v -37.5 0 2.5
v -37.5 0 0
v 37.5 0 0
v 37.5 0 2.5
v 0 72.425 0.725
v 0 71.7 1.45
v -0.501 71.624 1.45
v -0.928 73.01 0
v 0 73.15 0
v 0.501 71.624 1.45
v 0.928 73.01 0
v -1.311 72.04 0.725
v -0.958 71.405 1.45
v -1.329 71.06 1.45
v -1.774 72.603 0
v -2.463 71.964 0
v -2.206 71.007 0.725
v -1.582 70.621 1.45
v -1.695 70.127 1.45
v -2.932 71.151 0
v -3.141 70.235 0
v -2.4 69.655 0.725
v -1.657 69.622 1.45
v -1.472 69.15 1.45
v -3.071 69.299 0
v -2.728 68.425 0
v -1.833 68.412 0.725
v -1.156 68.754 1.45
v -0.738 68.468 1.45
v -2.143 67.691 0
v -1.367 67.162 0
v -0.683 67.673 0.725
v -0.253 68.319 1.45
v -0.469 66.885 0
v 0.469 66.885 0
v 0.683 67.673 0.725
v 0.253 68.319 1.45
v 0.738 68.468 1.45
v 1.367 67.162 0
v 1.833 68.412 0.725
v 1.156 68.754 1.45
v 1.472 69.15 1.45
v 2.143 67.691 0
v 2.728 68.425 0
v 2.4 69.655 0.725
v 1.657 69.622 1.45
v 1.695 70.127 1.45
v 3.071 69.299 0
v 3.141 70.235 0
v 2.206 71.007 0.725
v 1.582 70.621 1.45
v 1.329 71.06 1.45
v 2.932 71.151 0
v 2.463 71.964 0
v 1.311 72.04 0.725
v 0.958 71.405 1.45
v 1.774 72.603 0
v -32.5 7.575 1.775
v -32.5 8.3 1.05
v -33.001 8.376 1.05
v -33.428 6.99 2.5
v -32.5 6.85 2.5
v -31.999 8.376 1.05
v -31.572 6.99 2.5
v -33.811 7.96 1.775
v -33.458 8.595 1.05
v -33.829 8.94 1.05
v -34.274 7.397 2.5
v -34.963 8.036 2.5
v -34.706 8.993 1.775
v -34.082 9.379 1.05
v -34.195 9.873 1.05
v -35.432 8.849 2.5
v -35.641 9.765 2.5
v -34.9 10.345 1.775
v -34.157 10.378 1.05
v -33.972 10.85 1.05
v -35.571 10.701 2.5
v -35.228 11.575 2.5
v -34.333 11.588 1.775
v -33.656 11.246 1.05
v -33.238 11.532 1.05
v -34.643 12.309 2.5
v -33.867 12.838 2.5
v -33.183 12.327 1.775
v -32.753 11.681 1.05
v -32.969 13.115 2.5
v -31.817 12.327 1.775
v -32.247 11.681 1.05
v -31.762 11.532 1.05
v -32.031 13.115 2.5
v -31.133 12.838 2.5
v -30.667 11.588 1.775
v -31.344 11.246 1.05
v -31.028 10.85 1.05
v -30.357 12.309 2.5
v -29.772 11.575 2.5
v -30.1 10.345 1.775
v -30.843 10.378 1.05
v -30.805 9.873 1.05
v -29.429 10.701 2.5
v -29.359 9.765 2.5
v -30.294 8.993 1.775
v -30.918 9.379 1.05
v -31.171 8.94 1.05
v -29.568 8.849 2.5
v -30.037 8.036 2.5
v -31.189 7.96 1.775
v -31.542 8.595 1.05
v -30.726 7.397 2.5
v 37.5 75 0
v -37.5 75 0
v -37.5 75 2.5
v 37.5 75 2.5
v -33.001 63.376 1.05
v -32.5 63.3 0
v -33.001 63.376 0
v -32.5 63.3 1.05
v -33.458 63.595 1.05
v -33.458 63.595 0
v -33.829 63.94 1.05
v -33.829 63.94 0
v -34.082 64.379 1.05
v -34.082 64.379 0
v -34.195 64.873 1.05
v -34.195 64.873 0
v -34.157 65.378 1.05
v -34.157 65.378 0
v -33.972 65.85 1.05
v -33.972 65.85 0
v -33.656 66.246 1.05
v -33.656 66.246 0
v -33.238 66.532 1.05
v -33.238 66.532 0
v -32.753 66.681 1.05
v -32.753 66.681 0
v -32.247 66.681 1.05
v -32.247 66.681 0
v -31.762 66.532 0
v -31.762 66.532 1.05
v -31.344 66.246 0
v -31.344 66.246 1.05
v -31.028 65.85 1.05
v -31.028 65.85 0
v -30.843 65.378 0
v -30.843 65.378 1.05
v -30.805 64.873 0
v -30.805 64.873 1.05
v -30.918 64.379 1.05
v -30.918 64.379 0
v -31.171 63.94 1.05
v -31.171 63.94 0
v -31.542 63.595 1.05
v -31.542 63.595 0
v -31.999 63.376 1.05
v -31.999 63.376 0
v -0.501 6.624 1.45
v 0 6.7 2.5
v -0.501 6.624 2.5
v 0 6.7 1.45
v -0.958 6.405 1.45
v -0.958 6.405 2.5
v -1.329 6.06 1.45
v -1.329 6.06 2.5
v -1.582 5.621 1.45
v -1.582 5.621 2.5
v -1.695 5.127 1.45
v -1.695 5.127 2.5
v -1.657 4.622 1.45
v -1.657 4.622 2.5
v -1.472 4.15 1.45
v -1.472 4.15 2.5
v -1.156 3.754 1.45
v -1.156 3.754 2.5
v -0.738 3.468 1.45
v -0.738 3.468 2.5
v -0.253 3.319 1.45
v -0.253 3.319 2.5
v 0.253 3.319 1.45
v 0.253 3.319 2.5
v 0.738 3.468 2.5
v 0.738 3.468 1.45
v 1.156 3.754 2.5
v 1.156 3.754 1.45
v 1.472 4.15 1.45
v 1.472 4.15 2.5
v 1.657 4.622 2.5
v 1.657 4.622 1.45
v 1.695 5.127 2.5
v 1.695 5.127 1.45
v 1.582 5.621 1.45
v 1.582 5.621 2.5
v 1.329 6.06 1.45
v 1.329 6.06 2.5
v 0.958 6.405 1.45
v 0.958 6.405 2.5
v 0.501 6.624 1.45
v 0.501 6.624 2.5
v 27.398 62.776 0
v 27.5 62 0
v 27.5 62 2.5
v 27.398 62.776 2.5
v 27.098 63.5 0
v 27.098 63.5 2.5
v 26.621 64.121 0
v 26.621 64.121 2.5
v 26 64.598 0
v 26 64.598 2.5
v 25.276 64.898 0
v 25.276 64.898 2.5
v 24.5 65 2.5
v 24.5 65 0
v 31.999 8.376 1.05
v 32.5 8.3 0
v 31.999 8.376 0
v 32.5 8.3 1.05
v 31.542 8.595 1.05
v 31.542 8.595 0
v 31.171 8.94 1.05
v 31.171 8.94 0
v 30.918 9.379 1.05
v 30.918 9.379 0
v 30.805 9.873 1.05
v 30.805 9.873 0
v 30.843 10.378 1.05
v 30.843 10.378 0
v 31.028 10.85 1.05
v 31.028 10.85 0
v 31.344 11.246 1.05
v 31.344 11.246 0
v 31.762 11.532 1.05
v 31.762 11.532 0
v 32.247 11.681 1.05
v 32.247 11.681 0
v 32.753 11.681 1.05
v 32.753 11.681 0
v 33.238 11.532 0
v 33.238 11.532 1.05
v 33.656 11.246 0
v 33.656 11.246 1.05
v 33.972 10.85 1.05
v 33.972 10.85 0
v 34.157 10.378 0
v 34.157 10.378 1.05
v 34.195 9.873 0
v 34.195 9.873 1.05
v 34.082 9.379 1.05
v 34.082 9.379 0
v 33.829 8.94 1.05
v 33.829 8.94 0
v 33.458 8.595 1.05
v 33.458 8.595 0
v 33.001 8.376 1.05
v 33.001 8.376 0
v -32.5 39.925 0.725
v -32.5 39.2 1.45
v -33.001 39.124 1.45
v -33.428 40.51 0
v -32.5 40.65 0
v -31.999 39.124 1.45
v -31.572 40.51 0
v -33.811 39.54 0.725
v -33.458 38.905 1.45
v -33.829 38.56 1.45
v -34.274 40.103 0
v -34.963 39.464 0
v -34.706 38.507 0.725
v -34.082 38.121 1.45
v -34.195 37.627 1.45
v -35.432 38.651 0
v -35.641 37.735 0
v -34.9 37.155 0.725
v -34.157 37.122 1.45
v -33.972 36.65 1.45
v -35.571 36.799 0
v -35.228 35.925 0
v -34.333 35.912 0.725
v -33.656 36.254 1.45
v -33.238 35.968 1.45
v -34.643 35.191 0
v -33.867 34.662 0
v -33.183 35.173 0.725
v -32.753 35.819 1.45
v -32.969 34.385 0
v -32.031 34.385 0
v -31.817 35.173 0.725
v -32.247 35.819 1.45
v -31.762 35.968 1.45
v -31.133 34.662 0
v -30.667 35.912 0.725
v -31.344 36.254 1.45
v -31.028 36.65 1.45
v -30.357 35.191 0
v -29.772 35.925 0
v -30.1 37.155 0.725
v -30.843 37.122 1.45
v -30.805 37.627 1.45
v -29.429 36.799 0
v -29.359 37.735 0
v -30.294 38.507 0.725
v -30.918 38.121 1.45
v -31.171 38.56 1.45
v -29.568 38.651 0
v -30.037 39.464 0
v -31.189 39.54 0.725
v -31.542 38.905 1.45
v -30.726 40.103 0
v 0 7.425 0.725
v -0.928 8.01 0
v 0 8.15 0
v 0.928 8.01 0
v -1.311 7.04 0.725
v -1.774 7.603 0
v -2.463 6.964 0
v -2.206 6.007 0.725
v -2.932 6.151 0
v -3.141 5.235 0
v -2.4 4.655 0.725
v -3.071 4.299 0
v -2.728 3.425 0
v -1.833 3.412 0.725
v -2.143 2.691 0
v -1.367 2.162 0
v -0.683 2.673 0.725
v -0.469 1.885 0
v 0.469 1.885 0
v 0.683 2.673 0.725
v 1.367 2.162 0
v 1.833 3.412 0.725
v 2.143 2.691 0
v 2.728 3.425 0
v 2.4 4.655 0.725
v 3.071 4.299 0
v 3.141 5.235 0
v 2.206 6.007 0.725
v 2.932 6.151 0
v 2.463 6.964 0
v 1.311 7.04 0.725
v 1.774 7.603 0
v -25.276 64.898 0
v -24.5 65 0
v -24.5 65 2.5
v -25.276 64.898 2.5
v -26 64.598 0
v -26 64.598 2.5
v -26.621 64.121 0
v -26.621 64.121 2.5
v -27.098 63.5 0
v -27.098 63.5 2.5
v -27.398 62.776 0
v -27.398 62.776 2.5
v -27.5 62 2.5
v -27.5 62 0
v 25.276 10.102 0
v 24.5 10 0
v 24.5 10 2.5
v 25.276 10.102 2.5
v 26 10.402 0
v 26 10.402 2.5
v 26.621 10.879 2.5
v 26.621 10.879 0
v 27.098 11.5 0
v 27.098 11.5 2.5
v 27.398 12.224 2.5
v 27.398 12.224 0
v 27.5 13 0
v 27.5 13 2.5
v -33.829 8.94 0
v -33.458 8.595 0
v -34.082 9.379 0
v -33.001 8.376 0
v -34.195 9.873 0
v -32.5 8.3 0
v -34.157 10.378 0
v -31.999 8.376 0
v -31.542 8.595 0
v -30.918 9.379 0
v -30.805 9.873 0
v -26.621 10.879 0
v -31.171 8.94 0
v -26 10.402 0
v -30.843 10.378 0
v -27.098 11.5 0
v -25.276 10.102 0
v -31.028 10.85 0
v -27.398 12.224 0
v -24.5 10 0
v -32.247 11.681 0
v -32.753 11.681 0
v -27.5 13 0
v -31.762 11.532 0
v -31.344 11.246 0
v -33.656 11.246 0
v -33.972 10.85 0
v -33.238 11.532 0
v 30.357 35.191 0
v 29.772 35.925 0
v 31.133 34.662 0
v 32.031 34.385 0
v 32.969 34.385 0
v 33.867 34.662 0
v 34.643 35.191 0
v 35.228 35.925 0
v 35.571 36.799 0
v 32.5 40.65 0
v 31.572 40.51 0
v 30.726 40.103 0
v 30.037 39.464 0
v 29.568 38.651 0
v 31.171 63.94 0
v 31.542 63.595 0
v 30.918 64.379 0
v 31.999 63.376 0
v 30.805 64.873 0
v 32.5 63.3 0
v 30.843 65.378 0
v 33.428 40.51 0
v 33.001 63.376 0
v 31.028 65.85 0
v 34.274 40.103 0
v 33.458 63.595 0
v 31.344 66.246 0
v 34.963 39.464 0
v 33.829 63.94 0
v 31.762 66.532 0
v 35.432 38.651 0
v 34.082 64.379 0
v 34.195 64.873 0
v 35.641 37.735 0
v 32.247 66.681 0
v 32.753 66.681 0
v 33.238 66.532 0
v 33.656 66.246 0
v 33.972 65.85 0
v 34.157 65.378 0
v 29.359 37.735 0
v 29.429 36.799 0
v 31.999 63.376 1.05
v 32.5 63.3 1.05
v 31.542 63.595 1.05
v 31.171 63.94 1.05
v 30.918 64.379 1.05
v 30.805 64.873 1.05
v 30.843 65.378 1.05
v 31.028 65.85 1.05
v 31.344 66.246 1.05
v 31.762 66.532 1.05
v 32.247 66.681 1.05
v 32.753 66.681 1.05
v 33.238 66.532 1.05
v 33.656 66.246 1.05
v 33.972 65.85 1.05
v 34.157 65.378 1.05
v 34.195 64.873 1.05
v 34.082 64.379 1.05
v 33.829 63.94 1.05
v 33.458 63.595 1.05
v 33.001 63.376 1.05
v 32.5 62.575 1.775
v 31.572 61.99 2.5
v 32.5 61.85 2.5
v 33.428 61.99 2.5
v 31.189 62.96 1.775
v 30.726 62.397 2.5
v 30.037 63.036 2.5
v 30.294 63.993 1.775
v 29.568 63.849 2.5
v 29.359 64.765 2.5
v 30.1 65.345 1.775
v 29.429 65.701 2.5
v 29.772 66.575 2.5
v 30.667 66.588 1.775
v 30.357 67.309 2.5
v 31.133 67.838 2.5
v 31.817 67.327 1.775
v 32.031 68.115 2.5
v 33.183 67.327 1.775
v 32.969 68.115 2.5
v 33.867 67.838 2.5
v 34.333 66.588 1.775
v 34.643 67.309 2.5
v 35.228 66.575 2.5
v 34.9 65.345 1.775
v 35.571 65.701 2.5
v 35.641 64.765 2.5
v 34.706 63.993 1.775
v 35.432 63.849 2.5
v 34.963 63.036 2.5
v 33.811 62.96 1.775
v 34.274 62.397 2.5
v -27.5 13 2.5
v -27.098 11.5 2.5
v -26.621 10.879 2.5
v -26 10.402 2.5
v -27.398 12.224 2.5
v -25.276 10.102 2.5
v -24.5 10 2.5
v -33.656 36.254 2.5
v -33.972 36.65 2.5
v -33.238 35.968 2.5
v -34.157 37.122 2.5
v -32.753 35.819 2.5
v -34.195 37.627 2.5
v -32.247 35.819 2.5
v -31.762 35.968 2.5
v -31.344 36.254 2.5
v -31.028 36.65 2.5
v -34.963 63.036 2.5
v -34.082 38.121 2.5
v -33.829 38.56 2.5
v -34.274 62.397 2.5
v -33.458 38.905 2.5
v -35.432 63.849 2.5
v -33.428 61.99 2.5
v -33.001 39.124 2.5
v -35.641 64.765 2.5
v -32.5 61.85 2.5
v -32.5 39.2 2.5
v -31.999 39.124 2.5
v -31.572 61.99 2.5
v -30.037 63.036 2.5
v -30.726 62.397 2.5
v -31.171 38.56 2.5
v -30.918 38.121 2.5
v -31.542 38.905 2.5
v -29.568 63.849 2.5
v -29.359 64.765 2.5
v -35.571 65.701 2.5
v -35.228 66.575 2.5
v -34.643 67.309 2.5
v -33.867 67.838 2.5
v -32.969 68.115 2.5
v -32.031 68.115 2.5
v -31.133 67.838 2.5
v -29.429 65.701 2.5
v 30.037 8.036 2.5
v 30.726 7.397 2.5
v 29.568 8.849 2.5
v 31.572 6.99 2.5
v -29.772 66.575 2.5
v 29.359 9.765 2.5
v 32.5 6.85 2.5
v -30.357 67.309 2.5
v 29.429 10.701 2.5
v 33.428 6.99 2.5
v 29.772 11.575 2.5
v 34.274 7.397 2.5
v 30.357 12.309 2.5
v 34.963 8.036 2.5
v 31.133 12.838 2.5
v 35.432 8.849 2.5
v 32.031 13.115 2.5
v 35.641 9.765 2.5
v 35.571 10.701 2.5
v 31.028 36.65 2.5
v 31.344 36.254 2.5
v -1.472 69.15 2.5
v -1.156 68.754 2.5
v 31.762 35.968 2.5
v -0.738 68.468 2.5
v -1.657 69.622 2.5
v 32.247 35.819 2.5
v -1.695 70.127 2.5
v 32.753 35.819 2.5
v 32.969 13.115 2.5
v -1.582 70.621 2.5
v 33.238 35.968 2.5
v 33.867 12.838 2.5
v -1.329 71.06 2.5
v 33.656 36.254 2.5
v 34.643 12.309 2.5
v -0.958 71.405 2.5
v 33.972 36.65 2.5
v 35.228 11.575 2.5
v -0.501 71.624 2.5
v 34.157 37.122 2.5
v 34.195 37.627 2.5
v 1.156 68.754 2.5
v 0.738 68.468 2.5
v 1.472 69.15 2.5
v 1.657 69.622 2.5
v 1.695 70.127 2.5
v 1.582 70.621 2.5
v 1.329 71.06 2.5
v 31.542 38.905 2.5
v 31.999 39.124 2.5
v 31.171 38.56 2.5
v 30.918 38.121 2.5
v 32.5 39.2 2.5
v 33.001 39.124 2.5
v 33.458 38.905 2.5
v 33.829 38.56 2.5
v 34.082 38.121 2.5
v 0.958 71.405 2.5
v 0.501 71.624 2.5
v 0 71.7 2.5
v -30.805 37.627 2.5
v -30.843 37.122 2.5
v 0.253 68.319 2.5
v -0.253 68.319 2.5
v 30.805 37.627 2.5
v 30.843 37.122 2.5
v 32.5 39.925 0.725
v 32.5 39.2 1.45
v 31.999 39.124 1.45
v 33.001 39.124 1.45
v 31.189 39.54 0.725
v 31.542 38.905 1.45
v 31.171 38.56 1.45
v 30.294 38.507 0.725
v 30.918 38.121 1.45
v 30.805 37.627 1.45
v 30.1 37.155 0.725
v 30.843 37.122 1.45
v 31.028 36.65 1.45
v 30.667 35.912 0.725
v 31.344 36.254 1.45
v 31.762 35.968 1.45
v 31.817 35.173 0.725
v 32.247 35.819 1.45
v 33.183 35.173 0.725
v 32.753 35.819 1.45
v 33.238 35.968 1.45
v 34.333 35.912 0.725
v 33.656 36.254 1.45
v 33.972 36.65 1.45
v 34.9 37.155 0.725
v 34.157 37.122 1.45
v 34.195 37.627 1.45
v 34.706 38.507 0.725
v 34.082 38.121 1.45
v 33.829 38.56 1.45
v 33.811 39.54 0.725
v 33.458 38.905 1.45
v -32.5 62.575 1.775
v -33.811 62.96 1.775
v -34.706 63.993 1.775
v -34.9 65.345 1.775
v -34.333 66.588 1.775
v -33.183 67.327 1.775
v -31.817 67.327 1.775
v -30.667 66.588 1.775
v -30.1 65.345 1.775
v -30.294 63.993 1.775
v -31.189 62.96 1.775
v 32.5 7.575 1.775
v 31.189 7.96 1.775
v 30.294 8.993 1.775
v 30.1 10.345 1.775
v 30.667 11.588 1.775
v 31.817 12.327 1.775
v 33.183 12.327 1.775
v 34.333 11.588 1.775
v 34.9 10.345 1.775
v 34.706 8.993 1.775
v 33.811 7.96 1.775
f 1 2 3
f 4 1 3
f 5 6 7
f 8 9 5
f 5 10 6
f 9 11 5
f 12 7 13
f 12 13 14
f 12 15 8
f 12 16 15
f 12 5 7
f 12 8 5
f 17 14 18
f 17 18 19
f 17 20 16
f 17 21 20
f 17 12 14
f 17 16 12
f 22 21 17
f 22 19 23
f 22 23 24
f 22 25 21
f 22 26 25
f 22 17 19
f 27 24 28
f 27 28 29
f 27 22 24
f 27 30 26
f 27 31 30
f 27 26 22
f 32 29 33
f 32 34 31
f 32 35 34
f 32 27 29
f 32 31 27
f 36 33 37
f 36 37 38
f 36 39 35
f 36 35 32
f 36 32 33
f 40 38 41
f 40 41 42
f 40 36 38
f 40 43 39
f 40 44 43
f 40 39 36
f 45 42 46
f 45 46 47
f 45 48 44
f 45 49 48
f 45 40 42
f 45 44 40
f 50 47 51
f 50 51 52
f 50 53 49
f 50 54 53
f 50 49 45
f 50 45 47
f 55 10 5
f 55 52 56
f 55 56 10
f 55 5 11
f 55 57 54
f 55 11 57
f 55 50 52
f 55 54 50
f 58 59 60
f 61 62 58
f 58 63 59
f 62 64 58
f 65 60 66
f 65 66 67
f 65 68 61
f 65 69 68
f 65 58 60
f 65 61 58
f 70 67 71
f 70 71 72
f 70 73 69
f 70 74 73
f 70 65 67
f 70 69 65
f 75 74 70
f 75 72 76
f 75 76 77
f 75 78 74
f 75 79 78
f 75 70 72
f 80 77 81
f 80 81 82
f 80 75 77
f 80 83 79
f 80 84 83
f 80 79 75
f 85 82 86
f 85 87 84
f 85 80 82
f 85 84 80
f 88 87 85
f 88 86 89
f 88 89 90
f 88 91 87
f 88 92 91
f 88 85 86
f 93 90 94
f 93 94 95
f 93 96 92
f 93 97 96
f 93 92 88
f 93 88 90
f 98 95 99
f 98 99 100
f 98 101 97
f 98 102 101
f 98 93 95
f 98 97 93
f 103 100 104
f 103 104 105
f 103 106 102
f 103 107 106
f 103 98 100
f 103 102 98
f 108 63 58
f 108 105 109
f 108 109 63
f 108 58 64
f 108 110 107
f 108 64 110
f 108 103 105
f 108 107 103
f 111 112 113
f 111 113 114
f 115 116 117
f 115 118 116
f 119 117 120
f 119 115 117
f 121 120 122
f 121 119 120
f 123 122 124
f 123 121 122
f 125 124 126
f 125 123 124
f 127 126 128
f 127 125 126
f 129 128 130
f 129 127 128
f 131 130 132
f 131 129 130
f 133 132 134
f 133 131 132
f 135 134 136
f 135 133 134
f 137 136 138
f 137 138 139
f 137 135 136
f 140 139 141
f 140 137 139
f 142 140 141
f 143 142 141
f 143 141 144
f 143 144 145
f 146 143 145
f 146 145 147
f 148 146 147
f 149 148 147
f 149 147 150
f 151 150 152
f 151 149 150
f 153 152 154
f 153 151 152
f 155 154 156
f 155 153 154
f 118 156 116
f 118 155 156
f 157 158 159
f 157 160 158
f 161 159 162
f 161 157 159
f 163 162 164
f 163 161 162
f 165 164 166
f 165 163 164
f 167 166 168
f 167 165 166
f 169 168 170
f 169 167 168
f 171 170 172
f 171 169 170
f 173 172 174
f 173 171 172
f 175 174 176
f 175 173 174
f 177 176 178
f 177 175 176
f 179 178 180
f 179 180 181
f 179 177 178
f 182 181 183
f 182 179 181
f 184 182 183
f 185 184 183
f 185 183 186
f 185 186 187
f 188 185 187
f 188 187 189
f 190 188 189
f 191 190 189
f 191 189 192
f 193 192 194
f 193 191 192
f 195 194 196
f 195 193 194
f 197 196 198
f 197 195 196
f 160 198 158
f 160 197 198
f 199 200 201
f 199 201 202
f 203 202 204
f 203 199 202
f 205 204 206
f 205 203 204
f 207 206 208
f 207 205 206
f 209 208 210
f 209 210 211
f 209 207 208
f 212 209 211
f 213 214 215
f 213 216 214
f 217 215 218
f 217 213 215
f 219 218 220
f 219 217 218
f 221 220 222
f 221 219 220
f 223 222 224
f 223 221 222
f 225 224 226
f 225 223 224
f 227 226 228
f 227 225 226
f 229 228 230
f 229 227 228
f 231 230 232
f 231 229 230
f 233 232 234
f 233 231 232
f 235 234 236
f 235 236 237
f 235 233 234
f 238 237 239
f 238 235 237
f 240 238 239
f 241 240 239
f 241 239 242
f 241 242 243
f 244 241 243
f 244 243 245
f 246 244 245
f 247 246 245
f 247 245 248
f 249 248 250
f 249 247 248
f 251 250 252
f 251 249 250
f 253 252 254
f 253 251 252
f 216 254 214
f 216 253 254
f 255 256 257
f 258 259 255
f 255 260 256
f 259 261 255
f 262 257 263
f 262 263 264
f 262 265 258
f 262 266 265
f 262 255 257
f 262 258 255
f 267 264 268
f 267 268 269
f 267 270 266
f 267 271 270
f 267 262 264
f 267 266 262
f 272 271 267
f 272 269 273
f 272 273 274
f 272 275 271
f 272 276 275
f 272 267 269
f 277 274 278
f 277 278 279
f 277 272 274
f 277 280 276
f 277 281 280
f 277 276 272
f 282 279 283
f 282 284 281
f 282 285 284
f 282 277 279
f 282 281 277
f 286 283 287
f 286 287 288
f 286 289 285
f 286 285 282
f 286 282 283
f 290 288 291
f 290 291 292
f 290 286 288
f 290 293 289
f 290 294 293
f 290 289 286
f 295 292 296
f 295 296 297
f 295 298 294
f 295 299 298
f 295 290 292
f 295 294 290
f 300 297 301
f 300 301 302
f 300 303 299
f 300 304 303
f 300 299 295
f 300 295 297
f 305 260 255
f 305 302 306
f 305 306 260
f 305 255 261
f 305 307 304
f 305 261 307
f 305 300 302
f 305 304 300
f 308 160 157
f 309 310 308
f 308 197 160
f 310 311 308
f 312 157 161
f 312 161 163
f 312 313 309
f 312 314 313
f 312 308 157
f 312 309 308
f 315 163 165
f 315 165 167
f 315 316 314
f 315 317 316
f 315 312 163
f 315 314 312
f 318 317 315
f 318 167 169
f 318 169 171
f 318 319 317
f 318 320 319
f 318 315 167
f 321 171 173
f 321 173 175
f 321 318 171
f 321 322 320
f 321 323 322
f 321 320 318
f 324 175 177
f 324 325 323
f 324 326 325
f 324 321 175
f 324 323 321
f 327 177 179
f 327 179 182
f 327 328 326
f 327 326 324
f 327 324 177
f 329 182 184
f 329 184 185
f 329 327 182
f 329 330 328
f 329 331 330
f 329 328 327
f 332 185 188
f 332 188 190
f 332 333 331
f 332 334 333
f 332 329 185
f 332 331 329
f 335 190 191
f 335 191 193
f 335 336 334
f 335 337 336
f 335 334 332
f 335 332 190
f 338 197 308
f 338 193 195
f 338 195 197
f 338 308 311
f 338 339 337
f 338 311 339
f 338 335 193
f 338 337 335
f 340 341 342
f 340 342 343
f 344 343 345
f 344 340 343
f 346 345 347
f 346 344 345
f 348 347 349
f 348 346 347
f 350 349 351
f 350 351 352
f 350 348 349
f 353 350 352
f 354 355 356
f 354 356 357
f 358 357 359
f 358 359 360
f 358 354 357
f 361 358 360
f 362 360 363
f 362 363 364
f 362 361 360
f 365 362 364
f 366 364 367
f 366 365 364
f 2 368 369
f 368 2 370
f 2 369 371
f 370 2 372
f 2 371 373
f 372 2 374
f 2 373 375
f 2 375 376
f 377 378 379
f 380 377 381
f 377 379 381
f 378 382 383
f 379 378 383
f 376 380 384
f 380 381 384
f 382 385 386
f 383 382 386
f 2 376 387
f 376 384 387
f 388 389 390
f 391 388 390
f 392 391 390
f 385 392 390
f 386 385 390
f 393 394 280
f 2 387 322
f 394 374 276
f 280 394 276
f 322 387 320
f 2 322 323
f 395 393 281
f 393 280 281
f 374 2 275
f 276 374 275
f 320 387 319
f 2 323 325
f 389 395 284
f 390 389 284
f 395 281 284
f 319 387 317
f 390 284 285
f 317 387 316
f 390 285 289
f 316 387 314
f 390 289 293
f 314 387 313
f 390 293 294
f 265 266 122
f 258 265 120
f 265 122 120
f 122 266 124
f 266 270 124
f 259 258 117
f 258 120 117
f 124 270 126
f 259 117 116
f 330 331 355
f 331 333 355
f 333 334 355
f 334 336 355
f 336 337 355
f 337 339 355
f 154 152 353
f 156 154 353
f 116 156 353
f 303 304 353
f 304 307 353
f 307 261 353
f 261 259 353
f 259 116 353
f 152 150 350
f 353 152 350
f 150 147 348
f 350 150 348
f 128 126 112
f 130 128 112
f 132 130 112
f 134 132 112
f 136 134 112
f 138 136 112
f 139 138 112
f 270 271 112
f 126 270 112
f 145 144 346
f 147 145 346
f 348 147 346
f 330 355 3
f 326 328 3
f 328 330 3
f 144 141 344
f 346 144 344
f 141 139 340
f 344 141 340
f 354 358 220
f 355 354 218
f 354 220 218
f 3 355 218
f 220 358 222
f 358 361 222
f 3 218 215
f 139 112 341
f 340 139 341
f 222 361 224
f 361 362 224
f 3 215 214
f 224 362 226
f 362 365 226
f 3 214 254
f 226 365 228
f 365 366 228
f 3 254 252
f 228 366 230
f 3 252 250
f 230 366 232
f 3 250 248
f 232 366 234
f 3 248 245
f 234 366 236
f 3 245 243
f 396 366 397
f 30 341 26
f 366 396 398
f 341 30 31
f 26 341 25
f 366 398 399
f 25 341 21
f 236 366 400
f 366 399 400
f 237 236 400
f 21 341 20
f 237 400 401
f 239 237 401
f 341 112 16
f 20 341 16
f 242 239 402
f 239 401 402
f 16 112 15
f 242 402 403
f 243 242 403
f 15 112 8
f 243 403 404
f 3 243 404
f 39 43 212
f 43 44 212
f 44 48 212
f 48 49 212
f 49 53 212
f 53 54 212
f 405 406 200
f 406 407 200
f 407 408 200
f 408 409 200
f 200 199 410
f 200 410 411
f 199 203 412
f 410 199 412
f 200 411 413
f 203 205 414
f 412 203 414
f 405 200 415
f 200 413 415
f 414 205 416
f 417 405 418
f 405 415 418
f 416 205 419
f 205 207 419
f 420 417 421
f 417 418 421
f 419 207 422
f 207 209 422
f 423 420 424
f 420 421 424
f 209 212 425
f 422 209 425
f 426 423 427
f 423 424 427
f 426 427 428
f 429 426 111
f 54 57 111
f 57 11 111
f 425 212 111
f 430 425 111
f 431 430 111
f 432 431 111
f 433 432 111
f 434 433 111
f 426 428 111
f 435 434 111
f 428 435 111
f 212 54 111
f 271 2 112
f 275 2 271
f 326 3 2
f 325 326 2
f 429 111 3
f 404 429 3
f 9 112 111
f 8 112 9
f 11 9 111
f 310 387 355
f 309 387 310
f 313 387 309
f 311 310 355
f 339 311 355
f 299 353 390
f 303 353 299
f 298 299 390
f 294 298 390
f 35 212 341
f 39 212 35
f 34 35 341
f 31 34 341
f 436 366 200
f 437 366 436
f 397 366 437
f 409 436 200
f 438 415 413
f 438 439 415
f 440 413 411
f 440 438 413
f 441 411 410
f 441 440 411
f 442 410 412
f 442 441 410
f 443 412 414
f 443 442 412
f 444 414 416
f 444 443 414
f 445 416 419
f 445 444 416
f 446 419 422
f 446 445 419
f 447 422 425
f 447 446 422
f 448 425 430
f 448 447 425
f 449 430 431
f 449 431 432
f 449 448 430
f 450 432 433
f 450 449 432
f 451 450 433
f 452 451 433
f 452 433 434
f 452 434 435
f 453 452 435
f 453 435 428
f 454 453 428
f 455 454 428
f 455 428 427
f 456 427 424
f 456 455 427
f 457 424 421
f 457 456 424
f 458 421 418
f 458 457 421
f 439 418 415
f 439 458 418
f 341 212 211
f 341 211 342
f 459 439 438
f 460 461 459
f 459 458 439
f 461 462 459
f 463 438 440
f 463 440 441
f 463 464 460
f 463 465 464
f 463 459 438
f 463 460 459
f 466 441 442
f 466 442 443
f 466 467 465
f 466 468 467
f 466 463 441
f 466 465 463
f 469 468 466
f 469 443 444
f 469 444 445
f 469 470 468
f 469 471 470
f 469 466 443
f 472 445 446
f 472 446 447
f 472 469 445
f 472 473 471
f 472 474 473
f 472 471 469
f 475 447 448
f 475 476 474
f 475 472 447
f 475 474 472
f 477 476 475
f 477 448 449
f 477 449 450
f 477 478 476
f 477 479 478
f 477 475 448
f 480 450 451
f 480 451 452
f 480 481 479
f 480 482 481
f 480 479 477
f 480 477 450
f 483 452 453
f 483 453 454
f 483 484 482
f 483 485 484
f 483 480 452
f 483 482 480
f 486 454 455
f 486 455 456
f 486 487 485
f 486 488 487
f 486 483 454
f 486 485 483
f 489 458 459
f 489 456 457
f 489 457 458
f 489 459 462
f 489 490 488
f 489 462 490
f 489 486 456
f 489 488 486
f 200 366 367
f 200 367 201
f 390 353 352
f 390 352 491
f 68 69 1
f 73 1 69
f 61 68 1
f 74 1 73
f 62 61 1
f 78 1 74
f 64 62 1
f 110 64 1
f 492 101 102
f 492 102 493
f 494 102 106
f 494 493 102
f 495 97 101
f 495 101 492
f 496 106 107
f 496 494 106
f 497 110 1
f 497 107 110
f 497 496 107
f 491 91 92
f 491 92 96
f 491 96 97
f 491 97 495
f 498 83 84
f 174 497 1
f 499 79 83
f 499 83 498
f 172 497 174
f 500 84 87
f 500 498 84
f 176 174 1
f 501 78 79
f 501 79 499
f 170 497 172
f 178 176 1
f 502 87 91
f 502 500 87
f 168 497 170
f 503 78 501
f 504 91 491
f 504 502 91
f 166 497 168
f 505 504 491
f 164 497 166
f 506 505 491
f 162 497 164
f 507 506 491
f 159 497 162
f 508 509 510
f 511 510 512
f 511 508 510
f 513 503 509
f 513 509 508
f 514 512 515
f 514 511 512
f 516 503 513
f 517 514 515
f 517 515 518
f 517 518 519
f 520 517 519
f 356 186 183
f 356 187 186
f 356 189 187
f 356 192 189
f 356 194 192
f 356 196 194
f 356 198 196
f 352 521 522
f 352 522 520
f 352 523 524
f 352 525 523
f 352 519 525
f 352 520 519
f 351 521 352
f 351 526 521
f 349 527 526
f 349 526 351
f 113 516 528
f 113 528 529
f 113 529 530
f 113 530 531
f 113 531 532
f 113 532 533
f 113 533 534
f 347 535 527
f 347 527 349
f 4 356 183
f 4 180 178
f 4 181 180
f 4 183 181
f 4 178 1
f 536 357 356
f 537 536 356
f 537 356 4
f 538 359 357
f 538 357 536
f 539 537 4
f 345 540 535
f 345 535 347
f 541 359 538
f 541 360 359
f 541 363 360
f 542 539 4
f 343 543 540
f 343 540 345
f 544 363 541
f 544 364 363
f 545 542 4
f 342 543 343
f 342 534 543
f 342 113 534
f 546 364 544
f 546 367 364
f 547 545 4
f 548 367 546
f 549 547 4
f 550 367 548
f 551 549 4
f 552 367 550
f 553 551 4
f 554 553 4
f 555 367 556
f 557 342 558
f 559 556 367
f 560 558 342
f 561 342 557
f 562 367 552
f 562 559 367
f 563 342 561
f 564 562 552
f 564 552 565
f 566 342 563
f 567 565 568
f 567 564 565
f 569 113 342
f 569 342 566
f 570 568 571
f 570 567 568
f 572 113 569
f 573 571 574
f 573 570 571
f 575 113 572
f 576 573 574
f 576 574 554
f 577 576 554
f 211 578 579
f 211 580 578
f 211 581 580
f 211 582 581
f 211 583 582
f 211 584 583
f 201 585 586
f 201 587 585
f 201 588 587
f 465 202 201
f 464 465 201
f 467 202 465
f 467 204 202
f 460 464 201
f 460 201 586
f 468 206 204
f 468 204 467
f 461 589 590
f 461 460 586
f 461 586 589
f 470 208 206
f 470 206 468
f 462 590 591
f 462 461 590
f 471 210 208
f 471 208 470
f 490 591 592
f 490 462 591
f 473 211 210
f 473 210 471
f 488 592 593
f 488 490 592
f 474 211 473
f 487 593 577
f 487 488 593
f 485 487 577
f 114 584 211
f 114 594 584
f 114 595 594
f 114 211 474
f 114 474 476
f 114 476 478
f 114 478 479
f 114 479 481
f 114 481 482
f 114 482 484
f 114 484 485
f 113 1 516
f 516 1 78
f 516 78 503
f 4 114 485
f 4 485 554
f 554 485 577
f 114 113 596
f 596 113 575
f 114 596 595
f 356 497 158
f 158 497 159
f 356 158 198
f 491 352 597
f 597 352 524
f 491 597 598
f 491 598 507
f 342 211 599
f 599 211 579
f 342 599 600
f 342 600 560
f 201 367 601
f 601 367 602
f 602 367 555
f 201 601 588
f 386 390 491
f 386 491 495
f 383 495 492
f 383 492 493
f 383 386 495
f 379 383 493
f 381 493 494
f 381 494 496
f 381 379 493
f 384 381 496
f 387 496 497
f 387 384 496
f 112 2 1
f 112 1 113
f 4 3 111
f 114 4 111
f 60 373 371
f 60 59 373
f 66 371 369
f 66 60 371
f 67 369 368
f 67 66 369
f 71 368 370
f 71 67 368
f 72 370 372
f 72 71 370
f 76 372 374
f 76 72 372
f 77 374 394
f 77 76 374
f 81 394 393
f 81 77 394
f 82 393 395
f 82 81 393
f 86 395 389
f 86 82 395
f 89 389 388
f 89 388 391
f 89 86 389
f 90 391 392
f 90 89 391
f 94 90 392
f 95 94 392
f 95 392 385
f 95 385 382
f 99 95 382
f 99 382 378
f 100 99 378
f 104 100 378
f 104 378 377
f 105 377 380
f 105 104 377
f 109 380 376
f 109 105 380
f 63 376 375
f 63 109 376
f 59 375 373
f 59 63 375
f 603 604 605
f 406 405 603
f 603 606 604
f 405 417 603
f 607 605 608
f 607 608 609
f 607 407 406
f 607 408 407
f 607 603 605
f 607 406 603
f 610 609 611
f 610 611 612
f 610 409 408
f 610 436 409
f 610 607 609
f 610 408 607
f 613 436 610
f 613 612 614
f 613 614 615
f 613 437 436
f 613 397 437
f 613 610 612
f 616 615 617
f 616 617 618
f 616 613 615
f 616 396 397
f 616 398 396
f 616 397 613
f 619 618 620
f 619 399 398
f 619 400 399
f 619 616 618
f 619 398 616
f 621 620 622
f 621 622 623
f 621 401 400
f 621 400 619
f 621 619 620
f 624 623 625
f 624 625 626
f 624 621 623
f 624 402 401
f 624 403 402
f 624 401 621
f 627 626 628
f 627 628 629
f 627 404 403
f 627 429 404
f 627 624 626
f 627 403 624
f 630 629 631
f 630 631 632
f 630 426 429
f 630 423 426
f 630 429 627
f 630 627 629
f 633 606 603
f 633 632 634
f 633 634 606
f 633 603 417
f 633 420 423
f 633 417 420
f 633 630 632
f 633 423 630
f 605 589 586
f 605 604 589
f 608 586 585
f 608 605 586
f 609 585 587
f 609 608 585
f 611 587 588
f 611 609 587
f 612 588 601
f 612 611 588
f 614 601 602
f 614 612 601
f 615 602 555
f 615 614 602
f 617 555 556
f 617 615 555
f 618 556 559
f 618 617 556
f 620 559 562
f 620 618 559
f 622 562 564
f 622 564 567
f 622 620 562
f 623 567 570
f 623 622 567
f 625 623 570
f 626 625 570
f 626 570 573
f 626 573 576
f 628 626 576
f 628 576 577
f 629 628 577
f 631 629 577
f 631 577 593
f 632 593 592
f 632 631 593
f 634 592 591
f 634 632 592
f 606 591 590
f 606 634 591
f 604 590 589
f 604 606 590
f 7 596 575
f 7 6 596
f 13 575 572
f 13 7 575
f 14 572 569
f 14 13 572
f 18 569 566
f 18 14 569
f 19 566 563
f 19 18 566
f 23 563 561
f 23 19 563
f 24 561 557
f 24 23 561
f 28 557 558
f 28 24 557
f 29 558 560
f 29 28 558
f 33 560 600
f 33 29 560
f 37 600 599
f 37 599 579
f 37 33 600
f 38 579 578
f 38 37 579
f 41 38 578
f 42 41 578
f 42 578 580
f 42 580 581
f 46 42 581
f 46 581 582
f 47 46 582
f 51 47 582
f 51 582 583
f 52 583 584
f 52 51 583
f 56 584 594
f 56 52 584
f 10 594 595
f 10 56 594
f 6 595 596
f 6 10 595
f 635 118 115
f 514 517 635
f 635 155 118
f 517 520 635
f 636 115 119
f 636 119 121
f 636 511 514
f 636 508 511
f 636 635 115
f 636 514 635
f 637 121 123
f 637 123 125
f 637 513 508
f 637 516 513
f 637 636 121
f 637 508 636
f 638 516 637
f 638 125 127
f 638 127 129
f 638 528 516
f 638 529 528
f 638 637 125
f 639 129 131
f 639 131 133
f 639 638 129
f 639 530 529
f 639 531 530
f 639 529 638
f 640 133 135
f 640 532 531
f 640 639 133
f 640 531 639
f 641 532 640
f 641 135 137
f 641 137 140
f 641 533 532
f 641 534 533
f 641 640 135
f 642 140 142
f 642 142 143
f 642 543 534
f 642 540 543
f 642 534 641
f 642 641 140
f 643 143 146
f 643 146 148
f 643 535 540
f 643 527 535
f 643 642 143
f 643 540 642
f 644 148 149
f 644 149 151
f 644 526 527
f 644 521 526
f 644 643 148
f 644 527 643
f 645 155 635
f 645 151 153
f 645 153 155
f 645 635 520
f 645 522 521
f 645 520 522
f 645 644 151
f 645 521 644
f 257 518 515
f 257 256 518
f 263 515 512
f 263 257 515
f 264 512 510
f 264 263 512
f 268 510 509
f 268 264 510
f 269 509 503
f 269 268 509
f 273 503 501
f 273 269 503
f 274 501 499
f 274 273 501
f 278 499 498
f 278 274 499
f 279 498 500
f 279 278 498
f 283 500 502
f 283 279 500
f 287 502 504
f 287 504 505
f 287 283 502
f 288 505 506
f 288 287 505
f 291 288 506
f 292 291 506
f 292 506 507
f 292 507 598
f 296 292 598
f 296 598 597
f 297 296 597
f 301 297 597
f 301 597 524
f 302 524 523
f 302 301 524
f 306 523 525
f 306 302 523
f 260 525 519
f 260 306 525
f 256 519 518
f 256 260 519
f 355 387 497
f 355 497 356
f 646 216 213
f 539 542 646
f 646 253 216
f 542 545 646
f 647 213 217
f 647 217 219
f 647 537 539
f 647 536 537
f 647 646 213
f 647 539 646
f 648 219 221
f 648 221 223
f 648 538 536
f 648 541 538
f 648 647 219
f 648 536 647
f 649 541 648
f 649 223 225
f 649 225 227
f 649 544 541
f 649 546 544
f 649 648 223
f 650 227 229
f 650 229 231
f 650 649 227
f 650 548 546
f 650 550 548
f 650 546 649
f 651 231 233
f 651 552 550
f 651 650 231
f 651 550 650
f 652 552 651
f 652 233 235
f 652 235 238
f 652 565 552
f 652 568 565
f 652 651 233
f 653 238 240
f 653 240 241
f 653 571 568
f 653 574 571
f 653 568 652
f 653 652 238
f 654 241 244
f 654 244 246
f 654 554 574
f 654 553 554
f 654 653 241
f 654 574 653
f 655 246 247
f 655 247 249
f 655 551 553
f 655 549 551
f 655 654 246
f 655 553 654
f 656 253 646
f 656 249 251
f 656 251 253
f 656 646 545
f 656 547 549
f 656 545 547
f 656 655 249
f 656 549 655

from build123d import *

# Parameters (mm, degrees)
SKETCH1_W                                      = 75
SKETCH1_H                                      = 75
BOSS_EXTRUDE1_DEPTH                            = 2.5
CSK_FOR_M3_OVAL_HEAD_MACHINE_SCREW1_AT_2_COUNT = 2
CSK_FOR_M3_OVAL_HEAD_MACHINE_SCREW1_AT_2_PITCH = 65
CSK_FOR_M3_OVAL_HEAD_MACHINE_SCREW1_AT_3_COUNT = 2
CSK_FOR_M3_OVAL_HEAD_MACHINE_SCREW1_AT_3_PITCH = 85.14693183
CSK_FOR_M3_OVAL_HEAD_MACHINE_SCREW1_AT_4_COUNT = 2
CSK_FOR_M3_OVAL_HEAD_MACHINE_SCREW1_AT_4_PITCH = 55
CSK_FOR_M3_OVAL_HEAD_MACHINE_SCREW2_AT_2_COUNT = 2
CSK_FOR_M3_OVAL_HEAD_MACHINE_SCREW2_AT_2_PITCH = 45.961940777
CSK_FOR_M3_OVAL_HEAD_MACHINE_SCREW2_AT_3_COUNT = 2
CSK_FOR_M3_OVAL_HEAD_MACHINE_SCREW2_AT_3_PITCH = 45.961940777
CSK_FOR_M3_OVAL_HEAD_MACHINE_SCREW2_AT_4_COUNT = 2
CSK_FOR_M3_OVAL_HEAD_MACHINE_SCREW2_AT_4_PITCH = 65


with BuildPart() as part:
    # Sketch1 → Boss-Extrude1 (new body)
    with BuildSketch(Plane.XY):
        with Locations((0, 37.5)):
            Rectangle(SKETCH1_W, SKETCH1_H)
        with BuildLine():
            Line((-24.5, 10), (24.5, 10))
            ThreePointArc((24.5, 10), (26.621320344, 10.878679656), (27.5, 13))
            Line((27.5, 13), (27.5, 62))
            ThreePointArc((27.5, 62), (26.621320344, 64.121320344), (24.5, 65))
            Line((24.5, 65), (-24.5, 65))
            ThreePointArc((-24.5, 65), (-26.621320344, 64.121320344), (-27.5, 62))
            Line((-27.5, 62), (-27.5, 13))
            ThreePointArc((-27.5, 13), (-26.621320344, 10.878679656), (-24.5, 10))
        make_face(mode=Mode.SUBTRACT)
    extrude(amount=BOSS_EXTRUDE1_DEPTH)

    # Sketch2 → CSK for M3 Oval Head Machine Screw1 (revolve, cut)
    with BuildSketch(Plane(origin=(32.5, 10, 2.5), x_dir=(0, -1, 0), z_dir=(1, 0, 0))):
        Polygon((0, 0), (0, 2.5), (1.7, 2.5), (1.7, 1.45), (3.15, 0), align=None)
    csk_for_m3_oval_head_machine_screw1 = revolve(axis=Axis((32.5, 10, 8.85), (0, 0, -1)), mode=Mode.SUBTRACT)

    # CSK for M3 Oval Head Machine Screw1 at 2: CSK for M3 Oval Head Machine Screw1 ×2
    with Locations(*[(-i * CSK_FOR_M3_OVAL_HEAD_MACHINE_SCREW1_AT_2_PITCH, 0, 0) for i in range(1, CSK_FOR_M3_OVAL_HEAD_MACHINE_SCREW1_AT_2_COUNT)]):
        add(csk_for_m3_oval_head_machine_screw1, mode=Mode.SUBTRACT)

    # CSK for M3 Oval Head Machine Screw1 at 3: CSK for M3 Oval Head Machine Screw1 ×2
    with Locations(*[Vector(-0.7633862853691147, 0.6459422414661737, 0) * (i * CSK_FOR_M3_OVAL_HEAD_MACHINE_SCREW1_AT_3_PITCH) for i in range(1, CSK_FOR_M3_OVAL_HEAD_MACHINE_SCREW1_AT_3_COUNT)]):
        add(csk_for_m3_oval_head_machine_screw1, mode=Mode.SUBTRACT)

    # CSK for M3 Oval Head Machine Screw1 at 4: CSK for M3 Oval Head Machine Screw1 ×2
    with Locations(*[(0, i * CSK_FOR_M3_OVAL_HEAD_MACHINE_SCREW1_AT_4_PITCH, 0) for i in range(1, CSK_FOR_M3_OVAL_HEAD_MACHINE_SCREW1_AT_4_COUNT)]):
        add(csk_for_m3_oval_head_machine_screw1, mode=Mode.SUBTRACT)

    # Sketch3 → CSK for M3 Oval Head Machine Screw2 (revolve, cut)
    with BuildSketch(Plane(origin=(0, 5, 0), x_dir=(0, 1, 0), z_dir=(1, 0, 0))):
        Polygon((0, 0), (0, 2.5), (1.7, 2.5), (1.7, 1.45), (3.15, 0), align=None)
    csk_for_m3_oval_head_machine_screw2 = revolve(axis=Axis((0, 5, -6.35), (0, 0, 1)), mode=Mode.SUBTRACT)

    # CSK for M3 Oval Head Machine Screw2 at 2: CSK for M3 Oval Head Machine Screw2 ×2
    with Locations(*[Vector(-0.7071067811865476, 0.7071067811865476, 0) * (i * CSK_FOR_M3_OVAL_HEAD_MACHINE_SCREW2_AT_2_PITCH) for i in range(1, CSK_FOR_M3_OVAL_HEAD_MACHINE_SCREW2_AT_2_COUNT)]):
        add(csk_for_m3_oval_head_machine_screw2, mode=Mode.SUBTRACT)

    # CSK for M3 Oval Head Machine Screw2 at 3: CSK for M3 Oval Head Machine Screw2 ×2
    with Locations(*[Vector(0.7071067811865475, 0.7071067811865476, 0) * (i * CSK_FOR_M3_OVAL_HEAD_MACHINE_SCREW2_AT_3_PITCH) for i in range(1, CSK_FOR_M3_OVAL_HEAD_MACHINE_SCREW2_AT_3_COUNT)]):
        add(csk_for_m3_oval_head_machine_screw2, mode=Mode.SUBTRACT)

    # CSK for M3 Oval Head Machine Screw2 at 4: CSK for M3 Oval Head Machine Screw2 ×2
    with Locations(*[(0, i * CSK_FOR_M3_OVAL_HEAD_MACHINE_SCREW2_AT_4_PITCH, 0) for i in range(1, CSK_FOR_M3_OVAL_HEAD_MACHINE_SCREW2_AT_4_COUNT)]):
        add(csk_for_m3_oval_head_machine_screw2, mode=Mode.SUBTRACT)


solid = part.part
